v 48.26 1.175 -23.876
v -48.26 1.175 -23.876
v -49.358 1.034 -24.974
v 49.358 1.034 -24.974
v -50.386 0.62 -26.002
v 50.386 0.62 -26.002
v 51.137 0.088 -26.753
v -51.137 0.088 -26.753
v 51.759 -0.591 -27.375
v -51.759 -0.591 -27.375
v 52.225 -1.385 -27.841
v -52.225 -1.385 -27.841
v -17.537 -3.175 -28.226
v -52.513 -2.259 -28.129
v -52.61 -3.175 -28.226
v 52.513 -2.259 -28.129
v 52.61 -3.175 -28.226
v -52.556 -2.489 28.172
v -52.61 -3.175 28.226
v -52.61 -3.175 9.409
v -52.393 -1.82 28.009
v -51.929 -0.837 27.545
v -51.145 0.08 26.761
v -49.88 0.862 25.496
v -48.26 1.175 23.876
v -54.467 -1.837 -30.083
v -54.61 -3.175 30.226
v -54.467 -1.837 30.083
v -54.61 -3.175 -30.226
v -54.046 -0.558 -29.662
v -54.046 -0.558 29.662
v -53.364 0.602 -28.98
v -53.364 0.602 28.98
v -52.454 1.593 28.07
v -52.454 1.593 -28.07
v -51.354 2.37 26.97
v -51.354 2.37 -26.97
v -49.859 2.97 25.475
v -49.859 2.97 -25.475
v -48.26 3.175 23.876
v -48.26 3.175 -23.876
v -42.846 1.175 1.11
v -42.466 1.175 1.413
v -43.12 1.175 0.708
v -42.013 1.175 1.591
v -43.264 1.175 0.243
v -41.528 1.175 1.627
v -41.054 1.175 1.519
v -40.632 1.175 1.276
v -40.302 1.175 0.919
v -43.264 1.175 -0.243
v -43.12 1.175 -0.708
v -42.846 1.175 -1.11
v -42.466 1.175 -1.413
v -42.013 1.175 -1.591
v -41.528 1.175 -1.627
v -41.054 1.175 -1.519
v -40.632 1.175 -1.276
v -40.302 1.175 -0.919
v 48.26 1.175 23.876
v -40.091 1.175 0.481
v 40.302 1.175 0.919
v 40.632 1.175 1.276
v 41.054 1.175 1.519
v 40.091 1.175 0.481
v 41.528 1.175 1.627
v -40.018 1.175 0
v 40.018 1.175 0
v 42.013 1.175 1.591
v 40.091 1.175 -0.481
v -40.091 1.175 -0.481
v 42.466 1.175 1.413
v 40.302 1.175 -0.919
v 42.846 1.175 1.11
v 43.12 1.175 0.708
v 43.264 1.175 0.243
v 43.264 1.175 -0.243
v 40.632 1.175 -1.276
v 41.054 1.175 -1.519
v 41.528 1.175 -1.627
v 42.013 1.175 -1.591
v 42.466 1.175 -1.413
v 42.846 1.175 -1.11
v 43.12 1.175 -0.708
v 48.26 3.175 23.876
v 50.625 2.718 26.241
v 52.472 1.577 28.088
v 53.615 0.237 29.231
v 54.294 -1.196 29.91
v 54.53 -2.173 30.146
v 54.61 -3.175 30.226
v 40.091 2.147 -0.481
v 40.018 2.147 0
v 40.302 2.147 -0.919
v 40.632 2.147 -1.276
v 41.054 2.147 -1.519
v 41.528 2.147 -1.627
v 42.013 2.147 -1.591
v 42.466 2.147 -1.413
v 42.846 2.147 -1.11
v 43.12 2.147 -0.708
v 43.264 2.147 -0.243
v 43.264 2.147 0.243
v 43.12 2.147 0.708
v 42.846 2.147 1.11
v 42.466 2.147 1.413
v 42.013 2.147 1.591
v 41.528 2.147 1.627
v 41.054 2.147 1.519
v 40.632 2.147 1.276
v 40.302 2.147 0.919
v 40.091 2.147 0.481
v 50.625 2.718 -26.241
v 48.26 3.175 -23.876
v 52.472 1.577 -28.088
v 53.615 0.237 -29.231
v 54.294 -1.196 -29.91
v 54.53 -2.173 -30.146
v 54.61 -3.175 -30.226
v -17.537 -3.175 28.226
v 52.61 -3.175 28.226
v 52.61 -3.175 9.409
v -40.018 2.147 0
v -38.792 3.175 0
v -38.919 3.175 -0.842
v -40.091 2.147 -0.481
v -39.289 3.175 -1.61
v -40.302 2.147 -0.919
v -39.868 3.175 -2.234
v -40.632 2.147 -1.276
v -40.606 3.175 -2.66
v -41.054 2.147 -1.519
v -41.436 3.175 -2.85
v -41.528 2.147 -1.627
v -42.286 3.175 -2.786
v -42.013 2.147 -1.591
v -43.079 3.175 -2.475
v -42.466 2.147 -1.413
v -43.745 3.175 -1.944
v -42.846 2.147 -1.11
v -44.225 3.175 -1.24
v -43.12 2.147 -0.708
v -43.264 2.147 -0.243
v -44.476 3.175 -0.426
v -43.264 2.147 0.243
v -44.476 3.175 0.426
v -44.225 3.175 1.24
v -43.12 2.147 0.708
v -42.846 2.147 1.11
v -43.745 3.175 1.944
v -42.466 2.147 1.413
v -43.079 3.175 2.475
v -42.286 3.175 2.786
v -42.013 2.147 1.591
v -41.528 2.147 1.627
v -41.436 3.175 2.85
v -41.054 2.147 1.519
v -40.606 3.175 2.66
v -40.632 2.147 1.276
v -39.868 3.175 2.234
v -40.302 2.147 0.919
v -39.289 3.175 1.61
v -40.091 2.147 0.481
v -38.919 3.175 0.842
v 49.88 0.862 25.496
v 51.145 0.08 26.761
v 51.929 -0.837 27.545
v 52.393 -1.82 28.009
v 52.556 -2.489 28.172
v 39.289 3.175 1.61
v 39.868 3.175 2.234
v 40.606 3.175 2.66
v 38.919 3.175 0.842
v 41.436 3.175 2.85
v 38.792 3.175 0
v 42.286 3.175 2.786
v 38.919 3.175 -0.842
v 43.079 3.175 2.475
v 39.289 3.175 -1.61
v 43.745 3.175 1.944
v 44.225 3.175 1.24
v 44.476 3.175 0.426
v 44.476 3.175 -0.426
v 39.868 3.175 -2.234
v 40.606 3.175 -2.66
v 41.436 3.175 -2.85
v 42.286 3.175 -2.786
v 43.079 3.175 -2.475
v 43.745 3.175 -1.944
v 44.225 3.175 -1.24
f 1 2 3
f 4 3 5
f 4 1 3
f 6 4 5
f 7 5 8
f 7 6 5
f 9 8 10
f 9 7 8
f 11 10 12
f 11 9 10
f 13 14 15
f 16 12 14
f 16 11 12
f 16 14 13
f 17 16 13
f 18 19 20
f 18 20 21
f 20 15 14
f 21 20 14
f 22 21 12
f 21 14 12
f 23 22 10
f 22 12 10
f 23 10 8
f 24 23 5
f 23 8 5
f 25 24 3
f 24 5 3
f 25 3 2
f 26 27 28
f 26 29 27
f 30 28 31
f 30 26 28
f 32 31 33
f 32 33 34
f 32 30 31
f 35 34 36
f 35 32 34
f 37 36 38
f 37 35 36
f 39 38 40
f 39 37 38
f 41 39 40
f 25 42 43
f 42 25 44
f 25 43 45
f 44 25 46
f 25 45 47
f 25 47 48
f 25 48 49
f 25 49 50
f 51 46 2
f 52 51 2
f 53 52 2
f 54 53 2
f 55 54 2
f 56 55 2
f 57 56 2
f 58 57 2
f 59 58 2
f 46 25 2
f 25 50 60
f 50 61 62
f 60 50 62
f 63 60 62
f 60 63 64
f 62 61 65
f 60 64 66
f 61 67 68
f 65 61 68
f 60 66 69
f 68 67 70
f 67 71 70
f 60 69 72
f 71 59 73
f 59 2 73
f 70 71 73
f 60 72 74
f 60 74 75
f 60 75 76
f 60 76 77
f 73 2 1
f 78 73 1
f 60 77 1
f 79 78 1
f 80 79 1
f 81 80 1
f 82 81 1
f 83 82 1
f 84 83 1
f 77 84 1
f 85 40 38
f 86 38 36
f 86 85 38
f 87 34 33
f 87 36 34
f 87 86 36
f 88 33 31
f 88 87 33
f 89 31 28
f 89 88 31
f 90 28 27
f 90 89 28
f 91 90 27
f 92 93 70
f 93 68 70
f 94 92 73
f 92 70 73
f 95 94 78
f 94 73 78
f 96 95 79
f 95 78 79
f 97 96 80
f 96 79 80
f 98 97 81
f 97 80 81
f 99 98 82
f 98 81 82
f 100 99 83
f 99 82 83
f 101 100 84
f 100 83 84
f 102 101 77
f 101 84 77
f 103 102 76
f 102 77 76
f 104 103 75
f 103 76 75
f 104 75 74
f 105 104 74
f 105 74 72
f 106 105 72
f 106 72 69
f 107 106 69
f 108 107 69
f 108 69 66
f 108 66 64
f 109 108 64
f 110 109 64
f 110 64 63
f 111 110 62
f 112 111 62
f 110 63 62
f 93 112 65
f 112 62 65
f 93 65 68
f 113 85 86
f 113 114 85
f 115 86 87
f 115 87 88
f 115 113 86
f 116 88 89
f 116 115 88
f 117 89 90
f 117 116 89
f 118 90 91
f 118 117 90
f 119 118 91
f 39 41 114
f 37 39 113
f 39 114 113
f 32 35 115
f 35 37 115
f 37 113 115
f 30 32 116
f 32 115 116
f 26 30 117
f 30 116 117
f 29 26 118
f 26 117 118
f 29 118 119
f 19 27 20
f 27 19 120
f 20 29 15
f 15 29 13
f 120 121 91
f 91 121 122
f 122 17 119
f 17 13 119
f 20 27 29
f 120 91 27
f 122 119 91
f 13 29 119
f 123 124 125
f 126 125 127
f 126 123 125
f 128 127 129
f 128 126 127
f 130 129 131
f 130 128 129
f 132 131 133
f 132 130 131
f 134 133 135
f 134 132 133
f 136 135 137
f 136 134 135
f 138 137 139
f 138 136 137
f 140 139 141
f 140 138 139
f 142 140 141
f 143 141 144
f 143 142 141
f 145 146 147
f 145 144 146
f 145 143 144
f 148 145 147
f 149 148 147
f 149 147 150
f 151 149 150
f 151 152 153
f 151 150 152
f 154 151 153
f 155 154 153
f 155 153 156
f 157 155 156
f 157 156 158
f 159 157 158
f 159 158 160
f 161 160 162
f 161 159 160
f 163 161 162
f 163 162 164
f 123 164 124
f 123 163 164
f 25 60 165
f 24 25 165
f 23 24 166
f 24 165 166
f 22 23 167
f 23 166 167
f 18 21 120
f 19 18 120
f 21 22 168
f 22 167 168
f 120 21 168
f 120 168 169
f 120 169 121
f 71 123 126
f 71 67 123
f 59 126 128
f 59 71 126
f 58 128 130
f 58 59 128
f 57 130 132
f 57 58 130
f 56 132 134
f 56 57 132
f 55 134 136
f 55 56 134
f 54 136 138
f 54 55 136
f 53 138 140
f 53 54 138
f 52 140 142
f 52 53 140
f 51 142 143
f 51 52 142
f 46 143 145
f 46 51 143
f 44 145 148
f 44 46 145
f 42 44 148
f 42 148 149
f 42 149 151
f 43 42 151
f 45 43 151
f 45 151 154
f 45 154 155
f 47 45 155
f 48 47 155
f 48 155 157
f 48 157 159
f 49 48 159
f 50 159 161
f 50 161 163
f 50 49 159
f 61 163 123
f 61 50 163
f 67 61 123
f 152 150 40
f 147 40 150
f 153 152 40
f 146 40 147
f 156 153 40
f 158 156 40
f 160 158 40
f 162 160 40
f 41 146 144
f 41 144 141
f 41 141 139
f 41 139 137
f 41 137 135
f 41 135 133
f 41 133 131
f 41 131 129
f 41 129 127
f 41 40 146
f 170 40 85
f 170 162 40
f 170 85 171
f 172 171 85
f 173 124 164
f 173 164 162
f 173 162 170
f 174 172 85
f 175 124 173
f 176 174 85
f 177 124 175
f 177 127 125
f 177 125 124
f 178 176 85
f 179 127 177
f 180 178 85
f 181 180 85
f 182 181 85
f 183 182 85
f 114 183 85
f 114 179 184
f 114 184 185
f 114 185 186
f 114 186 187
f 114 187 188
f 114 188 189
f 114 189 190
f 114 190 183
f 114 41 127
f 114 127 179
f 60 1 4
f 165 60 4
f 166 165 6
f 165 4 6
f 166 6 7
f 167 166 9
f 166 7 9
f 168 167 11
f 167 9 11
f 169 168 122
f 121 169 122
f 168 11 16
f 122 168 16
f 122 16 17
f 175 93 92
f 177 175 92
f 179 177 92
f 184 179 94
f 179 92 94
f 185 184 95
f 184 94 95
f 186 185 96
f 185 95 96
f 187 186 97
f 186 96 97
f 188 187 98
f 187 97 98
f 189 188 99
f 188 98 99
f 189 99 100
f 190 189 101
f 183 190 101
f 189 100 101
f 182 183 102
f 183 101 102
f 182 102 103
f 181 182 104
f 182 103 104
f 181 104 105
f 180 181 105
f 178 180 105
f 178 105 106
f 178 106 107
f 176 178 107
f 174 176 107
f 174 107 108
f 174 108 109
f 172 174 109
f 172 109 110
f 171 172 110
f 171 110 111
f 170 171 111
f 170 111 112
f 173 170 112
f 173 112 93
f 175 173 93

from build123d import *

# Parameters (mm, degrees)
SKETCH2_W                                         = 109.22
SKETCH2_H                                         = 60.452
BOSS_EXTRUDE1_DEPTH                               = 3.175
FILLET3_R                                         = 6.35
SHELL1_T                                          = -2
CSK_FOR_4_FLAT_HEAD_MACHINE_SCREW_100_D           = 3.2639
CSK_FOR_4_FLAT_HEAD_MACHINE_SCREW_100_CSINK_D     = 5.715
CSK_FOR_4_FLAT_HEAD_MACHINE_SCREW_100_CSINK_ANGLE = 100


with BuildPart() as part:
    # Sketch2 → Boss-Extrude1 (new, symmetric)
    with BuildSketch(Plane(origin=(0, 0, 0), x_dir=(1, 0, 0), z_dir=(0, 1, 0))):
        Rectangle(SKETCH2_W, SKETCH2_H)
    extrude(amount=BOSS_EXTRUDE1_DEPTH, both=True)

    # Fillet3
    fillet3_edges = [part.edges().sort_by_distance(p)[0] for p in [
        (-54.61, 3.175, 0),
        (0, 3.175, -30.226),
        (54.61, 3.175, 0),
        (0, 3.175, 30.226),
    ]]
    fillet(fillet3_edges, radius=FILLET3_R - 0.0001)  # a hair under: the kernel refuses the full size

    # Shell1
    shell1_openings = [part.faces().sort_by_distance(p)[0] for p in [
        (0, -3.175, 0),
    ]]
    offset(amount=SHELL1_T, openings=shell1_openings)

    # CSK for #4 Flat Head Machine Screw (100)1 (through all)
    with Locations(Plane(origin=(0, 3.175, 0), x_dir=(1, 0, 0), z_dir=(0, 1, 0))):
        with Locations((41.65, 0)):
            csk_for_4_flat_head_machine_screw_100 = CounterSinkHole(CSK_FOR_4_FLAT_HEAD_MACHINE_SCREW_100_D / 2, CSK_FOR_4_FLAT_HEAD_MACHINE_SCREW_100_CSINK_D / 2, counter_sink_angle=CSK_FOR_4_FLAT_HEAD_MACHINE_SCREW_100_CSINK_ANGLE)

    # Mirror1: CSK for #4 Flat Head Machine Screw (100)1 across plane
    add(csk_for_4_flat_head_machine_screw_100.mirror(Plane(origin=(0, 0, 0), x_dir=(0, 0, 1), z_dir=(1, 0, 0))), mode=Mode.SUBTRACT)


solid = part.part
